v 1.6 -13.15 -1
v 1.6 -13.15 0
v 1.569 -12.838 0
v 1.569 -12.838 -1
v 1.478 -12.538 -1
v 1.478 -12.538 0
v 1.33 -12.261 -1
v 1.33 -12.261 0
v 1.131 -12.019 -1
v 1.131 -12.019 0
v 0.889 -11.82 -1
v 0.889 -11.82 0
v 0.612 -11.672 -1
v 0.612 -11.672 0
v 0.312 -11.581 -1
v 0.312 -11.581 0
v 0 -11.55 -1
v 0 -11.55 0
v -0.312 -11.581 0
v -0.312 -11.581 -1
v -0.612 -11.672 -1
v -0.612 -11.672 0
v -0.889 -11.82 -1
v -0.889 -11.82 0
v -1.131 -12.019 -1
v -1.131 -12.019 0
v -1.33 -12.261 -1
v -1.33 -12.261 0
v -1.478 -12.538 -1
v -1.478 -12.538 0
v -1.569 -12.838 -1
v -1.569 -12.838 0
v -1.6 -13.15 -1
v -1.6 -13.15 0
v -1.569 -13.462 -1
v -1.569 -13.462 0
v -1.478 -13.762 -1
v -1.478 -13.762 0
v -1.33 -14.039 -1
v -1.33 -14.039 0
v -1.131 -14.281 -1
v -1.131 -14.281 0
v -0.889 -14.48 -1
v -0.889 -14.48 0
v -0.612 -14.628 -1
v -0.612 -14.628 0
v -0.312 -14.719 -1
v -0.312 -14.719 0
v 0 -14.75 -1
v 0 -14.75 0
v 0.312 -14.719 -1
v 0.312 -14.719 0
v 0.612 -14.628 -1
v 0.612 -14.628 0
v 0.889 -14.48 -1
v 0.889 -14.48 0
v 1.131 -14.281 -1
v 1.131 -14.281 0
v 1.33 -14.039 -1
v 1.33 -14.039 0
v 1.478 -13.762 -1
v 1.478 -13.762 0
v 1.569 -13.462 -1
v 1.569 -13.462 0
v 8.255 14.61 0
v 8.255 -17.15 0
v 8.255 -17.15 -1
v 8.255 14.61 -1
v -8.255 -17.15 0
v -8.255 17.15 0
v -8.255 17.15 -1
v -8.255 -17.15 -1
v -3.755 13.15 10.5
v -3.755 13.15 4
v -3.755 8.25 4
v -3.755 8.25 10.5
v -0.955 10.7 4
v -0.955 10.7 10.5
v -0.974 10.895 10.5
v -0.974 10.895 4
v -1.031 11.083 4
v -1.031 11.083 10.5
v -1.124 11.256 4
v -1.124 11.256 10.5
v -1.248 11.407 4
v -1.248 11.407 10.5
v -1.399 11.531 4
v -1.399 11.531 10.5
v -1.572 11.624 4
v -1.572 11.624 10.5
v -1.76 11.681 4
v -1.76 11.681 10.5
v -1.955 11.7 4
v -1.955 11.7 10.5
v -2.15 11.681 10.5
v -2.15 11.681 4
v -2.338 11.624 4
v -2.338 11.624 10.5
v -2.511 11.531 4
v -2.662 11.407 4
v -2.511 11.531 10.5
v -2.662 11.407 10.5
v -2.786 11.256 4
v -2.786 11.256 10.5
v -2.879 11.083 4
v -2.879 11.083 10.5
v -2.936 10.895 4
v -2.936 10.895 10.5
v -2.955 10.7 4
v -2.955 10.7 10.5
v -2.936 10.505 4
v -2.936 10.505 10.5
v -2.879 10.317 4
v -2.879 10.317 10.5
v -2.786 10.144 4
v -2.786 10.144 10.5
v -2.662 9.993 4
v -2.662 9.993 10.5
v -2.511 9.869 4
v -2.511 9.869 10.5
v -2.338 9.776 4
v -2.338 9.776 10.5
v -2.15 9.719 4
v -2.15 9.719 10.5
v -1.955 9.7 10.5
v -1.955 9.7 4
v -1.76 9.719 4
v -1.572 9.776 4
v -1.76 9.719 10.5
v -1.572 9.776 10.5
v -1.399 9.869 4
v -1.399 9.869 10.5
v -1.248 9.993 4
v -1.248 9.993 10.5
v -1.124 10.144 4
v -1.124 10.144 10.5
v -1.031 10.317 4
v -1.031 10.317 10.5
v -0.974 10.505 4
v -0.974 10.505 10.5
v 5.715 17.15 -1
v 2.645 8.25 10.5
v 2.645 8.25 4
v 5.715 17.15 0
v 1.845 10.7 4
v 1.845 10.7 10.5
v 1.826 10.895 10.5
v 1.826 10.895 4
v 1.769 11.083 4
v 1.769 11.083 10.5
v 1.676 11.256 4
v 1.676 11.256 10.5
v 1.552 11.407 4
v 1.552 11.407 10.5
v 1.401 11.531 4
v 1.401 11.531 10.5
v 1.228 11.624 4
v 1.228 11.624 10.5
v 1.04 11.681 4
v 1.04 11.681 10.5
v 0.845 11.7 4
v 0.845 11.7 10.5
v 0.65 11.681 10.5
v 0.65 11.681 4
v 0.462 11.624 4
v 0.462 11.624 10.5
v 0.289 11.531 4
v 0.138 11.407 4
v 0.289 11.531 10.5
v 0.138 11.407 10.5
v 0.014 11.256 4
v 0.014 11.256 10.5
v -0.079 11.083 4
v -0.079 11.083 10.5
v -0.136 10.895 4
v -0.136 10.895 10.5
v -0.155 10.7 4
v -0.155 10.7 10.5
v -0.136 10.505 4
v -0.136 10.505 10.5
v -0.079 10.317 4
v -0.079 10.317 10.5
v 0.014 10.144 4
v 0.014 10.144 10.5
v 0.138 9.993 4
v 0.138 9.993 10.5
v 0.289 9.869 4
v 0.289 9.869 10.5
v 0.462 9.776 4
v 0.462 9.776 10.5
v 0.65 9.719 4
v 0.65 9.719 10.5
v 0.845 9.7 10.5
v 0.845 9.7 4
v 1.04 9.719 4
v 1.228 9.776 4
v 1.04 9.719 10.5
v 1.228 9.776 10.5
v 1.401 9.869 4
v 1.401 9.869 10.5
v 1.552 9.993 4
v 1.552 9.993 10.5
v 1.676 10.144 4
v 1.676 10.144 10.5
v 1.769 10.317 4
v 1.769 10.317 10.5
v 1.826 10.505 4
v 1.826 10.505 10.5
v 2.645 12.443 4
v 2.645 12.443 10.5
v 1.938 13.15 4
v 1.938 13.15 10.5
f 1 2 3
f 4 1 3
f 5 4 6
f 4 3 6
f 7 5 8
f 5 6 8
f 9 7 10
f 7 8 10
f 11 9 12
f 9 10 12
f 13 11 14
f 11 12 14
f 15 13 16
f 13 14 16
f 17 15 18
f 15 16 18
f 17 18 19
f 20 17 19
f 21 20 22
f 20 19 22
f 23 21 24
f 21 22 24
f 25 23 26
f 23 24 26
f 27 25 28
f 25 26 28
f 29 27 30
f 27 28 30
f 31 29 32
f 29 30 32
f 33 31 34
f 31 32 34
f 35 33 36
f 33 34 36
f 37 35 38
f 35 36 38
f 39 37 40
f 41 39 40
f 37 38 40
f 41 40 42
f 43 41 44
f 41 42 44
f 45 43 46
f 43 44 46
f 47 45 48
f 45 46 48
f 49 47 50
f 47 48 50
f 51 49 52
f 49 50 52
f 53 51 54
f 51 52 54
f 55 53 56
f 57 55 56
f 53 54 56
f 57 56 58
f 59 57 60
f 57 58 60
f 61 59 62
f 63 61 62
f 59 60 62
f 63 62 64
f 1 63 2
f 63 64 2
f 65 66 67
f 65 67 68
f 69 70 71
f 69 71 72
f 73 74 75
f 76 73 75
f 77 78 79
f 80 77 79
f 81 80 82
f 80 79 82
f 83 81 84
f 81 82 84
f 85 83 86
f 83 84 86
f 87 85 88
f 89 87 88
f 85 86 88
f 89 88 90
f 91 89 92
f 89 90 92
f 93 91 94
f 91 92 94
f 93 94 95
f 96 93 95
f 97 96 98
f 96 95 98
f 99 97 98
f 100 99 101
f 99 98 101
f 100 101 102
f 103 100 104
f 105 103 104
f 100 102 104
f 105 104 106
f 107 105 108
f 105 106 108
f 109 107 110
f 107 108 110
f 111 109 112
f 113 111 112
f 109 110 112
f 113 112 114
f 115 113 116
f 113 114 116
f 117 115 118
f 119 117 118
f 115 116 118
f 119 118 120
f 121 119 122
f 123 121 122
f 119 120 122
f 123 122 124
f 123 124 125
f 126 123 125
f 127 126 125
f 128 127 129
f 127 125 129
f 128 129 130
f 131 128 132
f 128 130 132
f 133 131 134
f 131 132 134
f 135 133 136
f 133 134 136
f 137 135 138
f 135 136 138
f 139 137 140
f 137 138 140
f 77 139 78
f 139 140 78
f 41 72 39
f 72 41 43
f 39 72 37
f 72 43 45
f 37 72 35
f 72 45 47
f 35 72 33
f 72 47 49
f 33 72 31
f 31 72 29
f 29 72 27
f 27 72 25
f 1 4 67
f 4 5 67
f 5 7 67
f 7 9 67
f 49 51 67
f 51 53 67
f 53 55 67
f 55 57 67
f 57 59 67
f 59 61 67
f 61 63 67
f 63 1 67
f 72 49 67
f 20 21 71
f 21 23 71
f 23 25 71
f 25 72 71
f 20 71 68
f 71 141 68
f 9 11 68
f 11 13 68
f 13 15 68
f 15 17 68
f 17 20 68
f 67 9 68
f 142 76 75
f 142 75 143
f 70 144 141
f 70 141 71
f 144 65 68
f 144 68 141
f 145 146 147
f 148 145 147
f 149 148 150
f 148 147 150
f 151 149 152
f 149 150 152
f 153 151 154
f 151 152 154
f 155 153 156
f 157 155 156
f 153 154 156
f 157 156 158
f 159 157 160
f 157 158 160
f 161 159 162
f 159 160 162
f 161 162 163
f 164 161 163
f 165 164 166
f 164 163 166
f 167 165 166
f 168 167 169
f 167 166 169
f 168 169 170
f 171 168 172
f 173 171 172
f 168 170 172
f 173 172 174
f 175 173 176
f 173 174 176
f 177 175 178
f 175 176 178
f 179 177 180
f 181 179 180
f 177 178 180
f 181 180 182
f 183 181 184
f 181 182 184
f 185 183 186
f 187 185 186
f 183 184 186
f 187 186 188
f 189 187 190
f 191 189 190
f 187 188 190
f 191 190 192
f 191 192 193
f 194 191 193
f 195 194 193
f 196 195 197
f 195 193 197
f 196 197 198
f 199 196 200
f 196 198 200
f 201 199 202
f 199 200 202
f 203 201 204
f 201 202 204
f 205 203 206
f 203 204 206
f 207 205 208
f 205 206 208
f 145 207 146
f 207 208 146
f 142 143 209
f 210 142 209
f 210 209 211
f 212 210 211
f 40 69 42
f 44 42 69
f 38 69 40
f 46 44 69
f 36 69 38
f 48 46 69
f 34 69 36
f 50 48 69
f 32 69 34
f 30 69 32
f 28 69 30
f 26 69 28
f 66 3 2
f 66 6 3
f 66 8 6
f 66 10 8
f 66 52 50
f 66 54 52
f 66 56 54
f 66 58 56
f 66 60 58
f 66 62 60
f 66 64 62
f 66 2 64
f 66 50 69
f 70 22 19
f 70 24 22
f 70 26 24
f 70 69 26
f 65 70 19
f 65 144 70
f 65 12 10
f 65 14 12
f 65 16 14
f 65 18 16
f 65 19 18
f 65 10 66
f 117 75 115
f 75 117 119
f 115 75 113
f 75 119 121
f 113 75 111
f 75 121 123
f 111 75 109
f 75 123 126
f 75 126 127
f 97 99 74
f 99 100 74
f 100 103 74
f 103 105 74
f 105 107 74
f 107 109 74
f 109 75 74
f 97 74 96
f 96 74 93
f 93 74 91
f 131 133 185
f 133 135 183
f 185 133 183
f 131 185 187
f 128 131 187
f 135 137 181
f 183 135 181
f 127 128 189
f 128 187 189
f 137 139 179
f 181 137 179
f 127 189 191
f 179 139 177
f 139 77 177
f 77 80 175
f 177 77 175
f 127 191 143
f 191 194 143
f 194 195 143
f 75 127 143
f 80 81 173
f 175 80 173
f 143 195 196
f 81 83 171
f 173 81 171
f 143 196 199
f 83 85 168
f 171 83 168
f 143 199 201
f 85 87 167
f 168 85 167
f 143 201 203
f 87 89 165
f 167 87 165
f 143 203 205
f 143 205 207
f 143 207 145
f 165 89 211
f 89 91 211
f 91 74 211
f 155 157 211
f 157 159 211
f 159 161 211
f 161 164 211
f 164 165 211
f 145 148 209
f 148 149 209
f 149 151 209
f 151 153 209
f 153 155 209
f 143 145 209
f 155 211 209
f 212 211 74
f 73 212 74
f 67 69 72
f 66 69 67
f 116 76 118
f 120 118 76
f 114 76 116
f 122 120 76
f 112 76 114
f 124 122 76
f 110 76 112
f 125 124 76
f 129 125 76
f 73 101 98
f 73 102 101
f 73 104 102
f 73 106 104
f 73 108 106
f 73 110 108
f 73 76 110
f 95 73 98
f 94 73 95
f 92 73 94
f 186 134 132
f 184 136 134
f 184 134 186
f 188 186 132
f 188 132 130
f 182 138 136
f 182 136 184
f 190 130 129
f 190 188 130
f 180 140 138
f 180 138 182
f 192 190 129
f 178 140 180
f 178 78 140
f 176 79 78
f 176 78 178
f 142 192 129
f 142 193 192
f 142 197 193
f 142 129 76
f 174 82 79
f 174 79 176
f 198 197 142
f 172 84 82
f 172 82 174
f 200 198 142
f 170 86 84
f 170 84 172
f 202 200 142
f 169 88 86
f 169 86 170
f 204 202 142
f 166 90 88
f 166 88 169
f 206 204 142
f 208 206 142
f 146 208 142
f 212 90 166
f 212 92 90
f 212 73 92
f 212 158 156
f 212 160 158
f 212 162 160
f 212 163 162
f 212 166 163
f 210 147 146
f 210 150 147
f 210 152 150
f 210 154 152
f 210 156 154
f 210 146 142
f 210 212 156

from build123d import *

# Parameters (mm, degrees)
F1_DEPTH = 1
F2_R     = 1.6
F3_DEPTH = 1
F6_DEPTH = 6.5
F7_R     = 1
F8_DEPTH = 6.5


with BuildPart() as f1:
    # F0 (on Top) → F1 (new body)
    with BuildSketch(Plane.XY):
        Polygon((5.715, 17.15), (-8.255, 17.15), (-8.255, -17.15), (8.255, -17.15), (8.255, 14.61), align=None)
    extrude(amount=-F1_DEPTH)

    # F2 (on face) → F3 (cut, through all)
    with BuildSketch(Plane.XY):
        with Locations((0, -13.15)):
            Circle(F2_R)
    extrude(amount=-F3_DEPTH, mode=Mode.SUBTRACT)


with BuildPart() as f6:
    # F5 (on offset) → F6 (new body)
    with BuildSketch(Plane.XY.offset(4)):
        Polygon((1.937893, 13.15), (-3.755, 13.15), (-3.755, 8.25), (2.645, 8.25), (2.645, 12.442893), align=None)
    extrude(amount=F6_DEPTH)

    # F7 (on face) → F8 (cut, through all)
    with BuildSketch(Plane.XY.offset(10.5)):
        with Locations((-1.955, 10.7)):
            Circle(F7_R)
        with Locations((0.845, 10.7)):
            Circle(F7_R)
    extrude(amount=-F8_DEPTH, mode=Mode.SUBTRACT)


solid = Compound([f1.part, f6.part])
